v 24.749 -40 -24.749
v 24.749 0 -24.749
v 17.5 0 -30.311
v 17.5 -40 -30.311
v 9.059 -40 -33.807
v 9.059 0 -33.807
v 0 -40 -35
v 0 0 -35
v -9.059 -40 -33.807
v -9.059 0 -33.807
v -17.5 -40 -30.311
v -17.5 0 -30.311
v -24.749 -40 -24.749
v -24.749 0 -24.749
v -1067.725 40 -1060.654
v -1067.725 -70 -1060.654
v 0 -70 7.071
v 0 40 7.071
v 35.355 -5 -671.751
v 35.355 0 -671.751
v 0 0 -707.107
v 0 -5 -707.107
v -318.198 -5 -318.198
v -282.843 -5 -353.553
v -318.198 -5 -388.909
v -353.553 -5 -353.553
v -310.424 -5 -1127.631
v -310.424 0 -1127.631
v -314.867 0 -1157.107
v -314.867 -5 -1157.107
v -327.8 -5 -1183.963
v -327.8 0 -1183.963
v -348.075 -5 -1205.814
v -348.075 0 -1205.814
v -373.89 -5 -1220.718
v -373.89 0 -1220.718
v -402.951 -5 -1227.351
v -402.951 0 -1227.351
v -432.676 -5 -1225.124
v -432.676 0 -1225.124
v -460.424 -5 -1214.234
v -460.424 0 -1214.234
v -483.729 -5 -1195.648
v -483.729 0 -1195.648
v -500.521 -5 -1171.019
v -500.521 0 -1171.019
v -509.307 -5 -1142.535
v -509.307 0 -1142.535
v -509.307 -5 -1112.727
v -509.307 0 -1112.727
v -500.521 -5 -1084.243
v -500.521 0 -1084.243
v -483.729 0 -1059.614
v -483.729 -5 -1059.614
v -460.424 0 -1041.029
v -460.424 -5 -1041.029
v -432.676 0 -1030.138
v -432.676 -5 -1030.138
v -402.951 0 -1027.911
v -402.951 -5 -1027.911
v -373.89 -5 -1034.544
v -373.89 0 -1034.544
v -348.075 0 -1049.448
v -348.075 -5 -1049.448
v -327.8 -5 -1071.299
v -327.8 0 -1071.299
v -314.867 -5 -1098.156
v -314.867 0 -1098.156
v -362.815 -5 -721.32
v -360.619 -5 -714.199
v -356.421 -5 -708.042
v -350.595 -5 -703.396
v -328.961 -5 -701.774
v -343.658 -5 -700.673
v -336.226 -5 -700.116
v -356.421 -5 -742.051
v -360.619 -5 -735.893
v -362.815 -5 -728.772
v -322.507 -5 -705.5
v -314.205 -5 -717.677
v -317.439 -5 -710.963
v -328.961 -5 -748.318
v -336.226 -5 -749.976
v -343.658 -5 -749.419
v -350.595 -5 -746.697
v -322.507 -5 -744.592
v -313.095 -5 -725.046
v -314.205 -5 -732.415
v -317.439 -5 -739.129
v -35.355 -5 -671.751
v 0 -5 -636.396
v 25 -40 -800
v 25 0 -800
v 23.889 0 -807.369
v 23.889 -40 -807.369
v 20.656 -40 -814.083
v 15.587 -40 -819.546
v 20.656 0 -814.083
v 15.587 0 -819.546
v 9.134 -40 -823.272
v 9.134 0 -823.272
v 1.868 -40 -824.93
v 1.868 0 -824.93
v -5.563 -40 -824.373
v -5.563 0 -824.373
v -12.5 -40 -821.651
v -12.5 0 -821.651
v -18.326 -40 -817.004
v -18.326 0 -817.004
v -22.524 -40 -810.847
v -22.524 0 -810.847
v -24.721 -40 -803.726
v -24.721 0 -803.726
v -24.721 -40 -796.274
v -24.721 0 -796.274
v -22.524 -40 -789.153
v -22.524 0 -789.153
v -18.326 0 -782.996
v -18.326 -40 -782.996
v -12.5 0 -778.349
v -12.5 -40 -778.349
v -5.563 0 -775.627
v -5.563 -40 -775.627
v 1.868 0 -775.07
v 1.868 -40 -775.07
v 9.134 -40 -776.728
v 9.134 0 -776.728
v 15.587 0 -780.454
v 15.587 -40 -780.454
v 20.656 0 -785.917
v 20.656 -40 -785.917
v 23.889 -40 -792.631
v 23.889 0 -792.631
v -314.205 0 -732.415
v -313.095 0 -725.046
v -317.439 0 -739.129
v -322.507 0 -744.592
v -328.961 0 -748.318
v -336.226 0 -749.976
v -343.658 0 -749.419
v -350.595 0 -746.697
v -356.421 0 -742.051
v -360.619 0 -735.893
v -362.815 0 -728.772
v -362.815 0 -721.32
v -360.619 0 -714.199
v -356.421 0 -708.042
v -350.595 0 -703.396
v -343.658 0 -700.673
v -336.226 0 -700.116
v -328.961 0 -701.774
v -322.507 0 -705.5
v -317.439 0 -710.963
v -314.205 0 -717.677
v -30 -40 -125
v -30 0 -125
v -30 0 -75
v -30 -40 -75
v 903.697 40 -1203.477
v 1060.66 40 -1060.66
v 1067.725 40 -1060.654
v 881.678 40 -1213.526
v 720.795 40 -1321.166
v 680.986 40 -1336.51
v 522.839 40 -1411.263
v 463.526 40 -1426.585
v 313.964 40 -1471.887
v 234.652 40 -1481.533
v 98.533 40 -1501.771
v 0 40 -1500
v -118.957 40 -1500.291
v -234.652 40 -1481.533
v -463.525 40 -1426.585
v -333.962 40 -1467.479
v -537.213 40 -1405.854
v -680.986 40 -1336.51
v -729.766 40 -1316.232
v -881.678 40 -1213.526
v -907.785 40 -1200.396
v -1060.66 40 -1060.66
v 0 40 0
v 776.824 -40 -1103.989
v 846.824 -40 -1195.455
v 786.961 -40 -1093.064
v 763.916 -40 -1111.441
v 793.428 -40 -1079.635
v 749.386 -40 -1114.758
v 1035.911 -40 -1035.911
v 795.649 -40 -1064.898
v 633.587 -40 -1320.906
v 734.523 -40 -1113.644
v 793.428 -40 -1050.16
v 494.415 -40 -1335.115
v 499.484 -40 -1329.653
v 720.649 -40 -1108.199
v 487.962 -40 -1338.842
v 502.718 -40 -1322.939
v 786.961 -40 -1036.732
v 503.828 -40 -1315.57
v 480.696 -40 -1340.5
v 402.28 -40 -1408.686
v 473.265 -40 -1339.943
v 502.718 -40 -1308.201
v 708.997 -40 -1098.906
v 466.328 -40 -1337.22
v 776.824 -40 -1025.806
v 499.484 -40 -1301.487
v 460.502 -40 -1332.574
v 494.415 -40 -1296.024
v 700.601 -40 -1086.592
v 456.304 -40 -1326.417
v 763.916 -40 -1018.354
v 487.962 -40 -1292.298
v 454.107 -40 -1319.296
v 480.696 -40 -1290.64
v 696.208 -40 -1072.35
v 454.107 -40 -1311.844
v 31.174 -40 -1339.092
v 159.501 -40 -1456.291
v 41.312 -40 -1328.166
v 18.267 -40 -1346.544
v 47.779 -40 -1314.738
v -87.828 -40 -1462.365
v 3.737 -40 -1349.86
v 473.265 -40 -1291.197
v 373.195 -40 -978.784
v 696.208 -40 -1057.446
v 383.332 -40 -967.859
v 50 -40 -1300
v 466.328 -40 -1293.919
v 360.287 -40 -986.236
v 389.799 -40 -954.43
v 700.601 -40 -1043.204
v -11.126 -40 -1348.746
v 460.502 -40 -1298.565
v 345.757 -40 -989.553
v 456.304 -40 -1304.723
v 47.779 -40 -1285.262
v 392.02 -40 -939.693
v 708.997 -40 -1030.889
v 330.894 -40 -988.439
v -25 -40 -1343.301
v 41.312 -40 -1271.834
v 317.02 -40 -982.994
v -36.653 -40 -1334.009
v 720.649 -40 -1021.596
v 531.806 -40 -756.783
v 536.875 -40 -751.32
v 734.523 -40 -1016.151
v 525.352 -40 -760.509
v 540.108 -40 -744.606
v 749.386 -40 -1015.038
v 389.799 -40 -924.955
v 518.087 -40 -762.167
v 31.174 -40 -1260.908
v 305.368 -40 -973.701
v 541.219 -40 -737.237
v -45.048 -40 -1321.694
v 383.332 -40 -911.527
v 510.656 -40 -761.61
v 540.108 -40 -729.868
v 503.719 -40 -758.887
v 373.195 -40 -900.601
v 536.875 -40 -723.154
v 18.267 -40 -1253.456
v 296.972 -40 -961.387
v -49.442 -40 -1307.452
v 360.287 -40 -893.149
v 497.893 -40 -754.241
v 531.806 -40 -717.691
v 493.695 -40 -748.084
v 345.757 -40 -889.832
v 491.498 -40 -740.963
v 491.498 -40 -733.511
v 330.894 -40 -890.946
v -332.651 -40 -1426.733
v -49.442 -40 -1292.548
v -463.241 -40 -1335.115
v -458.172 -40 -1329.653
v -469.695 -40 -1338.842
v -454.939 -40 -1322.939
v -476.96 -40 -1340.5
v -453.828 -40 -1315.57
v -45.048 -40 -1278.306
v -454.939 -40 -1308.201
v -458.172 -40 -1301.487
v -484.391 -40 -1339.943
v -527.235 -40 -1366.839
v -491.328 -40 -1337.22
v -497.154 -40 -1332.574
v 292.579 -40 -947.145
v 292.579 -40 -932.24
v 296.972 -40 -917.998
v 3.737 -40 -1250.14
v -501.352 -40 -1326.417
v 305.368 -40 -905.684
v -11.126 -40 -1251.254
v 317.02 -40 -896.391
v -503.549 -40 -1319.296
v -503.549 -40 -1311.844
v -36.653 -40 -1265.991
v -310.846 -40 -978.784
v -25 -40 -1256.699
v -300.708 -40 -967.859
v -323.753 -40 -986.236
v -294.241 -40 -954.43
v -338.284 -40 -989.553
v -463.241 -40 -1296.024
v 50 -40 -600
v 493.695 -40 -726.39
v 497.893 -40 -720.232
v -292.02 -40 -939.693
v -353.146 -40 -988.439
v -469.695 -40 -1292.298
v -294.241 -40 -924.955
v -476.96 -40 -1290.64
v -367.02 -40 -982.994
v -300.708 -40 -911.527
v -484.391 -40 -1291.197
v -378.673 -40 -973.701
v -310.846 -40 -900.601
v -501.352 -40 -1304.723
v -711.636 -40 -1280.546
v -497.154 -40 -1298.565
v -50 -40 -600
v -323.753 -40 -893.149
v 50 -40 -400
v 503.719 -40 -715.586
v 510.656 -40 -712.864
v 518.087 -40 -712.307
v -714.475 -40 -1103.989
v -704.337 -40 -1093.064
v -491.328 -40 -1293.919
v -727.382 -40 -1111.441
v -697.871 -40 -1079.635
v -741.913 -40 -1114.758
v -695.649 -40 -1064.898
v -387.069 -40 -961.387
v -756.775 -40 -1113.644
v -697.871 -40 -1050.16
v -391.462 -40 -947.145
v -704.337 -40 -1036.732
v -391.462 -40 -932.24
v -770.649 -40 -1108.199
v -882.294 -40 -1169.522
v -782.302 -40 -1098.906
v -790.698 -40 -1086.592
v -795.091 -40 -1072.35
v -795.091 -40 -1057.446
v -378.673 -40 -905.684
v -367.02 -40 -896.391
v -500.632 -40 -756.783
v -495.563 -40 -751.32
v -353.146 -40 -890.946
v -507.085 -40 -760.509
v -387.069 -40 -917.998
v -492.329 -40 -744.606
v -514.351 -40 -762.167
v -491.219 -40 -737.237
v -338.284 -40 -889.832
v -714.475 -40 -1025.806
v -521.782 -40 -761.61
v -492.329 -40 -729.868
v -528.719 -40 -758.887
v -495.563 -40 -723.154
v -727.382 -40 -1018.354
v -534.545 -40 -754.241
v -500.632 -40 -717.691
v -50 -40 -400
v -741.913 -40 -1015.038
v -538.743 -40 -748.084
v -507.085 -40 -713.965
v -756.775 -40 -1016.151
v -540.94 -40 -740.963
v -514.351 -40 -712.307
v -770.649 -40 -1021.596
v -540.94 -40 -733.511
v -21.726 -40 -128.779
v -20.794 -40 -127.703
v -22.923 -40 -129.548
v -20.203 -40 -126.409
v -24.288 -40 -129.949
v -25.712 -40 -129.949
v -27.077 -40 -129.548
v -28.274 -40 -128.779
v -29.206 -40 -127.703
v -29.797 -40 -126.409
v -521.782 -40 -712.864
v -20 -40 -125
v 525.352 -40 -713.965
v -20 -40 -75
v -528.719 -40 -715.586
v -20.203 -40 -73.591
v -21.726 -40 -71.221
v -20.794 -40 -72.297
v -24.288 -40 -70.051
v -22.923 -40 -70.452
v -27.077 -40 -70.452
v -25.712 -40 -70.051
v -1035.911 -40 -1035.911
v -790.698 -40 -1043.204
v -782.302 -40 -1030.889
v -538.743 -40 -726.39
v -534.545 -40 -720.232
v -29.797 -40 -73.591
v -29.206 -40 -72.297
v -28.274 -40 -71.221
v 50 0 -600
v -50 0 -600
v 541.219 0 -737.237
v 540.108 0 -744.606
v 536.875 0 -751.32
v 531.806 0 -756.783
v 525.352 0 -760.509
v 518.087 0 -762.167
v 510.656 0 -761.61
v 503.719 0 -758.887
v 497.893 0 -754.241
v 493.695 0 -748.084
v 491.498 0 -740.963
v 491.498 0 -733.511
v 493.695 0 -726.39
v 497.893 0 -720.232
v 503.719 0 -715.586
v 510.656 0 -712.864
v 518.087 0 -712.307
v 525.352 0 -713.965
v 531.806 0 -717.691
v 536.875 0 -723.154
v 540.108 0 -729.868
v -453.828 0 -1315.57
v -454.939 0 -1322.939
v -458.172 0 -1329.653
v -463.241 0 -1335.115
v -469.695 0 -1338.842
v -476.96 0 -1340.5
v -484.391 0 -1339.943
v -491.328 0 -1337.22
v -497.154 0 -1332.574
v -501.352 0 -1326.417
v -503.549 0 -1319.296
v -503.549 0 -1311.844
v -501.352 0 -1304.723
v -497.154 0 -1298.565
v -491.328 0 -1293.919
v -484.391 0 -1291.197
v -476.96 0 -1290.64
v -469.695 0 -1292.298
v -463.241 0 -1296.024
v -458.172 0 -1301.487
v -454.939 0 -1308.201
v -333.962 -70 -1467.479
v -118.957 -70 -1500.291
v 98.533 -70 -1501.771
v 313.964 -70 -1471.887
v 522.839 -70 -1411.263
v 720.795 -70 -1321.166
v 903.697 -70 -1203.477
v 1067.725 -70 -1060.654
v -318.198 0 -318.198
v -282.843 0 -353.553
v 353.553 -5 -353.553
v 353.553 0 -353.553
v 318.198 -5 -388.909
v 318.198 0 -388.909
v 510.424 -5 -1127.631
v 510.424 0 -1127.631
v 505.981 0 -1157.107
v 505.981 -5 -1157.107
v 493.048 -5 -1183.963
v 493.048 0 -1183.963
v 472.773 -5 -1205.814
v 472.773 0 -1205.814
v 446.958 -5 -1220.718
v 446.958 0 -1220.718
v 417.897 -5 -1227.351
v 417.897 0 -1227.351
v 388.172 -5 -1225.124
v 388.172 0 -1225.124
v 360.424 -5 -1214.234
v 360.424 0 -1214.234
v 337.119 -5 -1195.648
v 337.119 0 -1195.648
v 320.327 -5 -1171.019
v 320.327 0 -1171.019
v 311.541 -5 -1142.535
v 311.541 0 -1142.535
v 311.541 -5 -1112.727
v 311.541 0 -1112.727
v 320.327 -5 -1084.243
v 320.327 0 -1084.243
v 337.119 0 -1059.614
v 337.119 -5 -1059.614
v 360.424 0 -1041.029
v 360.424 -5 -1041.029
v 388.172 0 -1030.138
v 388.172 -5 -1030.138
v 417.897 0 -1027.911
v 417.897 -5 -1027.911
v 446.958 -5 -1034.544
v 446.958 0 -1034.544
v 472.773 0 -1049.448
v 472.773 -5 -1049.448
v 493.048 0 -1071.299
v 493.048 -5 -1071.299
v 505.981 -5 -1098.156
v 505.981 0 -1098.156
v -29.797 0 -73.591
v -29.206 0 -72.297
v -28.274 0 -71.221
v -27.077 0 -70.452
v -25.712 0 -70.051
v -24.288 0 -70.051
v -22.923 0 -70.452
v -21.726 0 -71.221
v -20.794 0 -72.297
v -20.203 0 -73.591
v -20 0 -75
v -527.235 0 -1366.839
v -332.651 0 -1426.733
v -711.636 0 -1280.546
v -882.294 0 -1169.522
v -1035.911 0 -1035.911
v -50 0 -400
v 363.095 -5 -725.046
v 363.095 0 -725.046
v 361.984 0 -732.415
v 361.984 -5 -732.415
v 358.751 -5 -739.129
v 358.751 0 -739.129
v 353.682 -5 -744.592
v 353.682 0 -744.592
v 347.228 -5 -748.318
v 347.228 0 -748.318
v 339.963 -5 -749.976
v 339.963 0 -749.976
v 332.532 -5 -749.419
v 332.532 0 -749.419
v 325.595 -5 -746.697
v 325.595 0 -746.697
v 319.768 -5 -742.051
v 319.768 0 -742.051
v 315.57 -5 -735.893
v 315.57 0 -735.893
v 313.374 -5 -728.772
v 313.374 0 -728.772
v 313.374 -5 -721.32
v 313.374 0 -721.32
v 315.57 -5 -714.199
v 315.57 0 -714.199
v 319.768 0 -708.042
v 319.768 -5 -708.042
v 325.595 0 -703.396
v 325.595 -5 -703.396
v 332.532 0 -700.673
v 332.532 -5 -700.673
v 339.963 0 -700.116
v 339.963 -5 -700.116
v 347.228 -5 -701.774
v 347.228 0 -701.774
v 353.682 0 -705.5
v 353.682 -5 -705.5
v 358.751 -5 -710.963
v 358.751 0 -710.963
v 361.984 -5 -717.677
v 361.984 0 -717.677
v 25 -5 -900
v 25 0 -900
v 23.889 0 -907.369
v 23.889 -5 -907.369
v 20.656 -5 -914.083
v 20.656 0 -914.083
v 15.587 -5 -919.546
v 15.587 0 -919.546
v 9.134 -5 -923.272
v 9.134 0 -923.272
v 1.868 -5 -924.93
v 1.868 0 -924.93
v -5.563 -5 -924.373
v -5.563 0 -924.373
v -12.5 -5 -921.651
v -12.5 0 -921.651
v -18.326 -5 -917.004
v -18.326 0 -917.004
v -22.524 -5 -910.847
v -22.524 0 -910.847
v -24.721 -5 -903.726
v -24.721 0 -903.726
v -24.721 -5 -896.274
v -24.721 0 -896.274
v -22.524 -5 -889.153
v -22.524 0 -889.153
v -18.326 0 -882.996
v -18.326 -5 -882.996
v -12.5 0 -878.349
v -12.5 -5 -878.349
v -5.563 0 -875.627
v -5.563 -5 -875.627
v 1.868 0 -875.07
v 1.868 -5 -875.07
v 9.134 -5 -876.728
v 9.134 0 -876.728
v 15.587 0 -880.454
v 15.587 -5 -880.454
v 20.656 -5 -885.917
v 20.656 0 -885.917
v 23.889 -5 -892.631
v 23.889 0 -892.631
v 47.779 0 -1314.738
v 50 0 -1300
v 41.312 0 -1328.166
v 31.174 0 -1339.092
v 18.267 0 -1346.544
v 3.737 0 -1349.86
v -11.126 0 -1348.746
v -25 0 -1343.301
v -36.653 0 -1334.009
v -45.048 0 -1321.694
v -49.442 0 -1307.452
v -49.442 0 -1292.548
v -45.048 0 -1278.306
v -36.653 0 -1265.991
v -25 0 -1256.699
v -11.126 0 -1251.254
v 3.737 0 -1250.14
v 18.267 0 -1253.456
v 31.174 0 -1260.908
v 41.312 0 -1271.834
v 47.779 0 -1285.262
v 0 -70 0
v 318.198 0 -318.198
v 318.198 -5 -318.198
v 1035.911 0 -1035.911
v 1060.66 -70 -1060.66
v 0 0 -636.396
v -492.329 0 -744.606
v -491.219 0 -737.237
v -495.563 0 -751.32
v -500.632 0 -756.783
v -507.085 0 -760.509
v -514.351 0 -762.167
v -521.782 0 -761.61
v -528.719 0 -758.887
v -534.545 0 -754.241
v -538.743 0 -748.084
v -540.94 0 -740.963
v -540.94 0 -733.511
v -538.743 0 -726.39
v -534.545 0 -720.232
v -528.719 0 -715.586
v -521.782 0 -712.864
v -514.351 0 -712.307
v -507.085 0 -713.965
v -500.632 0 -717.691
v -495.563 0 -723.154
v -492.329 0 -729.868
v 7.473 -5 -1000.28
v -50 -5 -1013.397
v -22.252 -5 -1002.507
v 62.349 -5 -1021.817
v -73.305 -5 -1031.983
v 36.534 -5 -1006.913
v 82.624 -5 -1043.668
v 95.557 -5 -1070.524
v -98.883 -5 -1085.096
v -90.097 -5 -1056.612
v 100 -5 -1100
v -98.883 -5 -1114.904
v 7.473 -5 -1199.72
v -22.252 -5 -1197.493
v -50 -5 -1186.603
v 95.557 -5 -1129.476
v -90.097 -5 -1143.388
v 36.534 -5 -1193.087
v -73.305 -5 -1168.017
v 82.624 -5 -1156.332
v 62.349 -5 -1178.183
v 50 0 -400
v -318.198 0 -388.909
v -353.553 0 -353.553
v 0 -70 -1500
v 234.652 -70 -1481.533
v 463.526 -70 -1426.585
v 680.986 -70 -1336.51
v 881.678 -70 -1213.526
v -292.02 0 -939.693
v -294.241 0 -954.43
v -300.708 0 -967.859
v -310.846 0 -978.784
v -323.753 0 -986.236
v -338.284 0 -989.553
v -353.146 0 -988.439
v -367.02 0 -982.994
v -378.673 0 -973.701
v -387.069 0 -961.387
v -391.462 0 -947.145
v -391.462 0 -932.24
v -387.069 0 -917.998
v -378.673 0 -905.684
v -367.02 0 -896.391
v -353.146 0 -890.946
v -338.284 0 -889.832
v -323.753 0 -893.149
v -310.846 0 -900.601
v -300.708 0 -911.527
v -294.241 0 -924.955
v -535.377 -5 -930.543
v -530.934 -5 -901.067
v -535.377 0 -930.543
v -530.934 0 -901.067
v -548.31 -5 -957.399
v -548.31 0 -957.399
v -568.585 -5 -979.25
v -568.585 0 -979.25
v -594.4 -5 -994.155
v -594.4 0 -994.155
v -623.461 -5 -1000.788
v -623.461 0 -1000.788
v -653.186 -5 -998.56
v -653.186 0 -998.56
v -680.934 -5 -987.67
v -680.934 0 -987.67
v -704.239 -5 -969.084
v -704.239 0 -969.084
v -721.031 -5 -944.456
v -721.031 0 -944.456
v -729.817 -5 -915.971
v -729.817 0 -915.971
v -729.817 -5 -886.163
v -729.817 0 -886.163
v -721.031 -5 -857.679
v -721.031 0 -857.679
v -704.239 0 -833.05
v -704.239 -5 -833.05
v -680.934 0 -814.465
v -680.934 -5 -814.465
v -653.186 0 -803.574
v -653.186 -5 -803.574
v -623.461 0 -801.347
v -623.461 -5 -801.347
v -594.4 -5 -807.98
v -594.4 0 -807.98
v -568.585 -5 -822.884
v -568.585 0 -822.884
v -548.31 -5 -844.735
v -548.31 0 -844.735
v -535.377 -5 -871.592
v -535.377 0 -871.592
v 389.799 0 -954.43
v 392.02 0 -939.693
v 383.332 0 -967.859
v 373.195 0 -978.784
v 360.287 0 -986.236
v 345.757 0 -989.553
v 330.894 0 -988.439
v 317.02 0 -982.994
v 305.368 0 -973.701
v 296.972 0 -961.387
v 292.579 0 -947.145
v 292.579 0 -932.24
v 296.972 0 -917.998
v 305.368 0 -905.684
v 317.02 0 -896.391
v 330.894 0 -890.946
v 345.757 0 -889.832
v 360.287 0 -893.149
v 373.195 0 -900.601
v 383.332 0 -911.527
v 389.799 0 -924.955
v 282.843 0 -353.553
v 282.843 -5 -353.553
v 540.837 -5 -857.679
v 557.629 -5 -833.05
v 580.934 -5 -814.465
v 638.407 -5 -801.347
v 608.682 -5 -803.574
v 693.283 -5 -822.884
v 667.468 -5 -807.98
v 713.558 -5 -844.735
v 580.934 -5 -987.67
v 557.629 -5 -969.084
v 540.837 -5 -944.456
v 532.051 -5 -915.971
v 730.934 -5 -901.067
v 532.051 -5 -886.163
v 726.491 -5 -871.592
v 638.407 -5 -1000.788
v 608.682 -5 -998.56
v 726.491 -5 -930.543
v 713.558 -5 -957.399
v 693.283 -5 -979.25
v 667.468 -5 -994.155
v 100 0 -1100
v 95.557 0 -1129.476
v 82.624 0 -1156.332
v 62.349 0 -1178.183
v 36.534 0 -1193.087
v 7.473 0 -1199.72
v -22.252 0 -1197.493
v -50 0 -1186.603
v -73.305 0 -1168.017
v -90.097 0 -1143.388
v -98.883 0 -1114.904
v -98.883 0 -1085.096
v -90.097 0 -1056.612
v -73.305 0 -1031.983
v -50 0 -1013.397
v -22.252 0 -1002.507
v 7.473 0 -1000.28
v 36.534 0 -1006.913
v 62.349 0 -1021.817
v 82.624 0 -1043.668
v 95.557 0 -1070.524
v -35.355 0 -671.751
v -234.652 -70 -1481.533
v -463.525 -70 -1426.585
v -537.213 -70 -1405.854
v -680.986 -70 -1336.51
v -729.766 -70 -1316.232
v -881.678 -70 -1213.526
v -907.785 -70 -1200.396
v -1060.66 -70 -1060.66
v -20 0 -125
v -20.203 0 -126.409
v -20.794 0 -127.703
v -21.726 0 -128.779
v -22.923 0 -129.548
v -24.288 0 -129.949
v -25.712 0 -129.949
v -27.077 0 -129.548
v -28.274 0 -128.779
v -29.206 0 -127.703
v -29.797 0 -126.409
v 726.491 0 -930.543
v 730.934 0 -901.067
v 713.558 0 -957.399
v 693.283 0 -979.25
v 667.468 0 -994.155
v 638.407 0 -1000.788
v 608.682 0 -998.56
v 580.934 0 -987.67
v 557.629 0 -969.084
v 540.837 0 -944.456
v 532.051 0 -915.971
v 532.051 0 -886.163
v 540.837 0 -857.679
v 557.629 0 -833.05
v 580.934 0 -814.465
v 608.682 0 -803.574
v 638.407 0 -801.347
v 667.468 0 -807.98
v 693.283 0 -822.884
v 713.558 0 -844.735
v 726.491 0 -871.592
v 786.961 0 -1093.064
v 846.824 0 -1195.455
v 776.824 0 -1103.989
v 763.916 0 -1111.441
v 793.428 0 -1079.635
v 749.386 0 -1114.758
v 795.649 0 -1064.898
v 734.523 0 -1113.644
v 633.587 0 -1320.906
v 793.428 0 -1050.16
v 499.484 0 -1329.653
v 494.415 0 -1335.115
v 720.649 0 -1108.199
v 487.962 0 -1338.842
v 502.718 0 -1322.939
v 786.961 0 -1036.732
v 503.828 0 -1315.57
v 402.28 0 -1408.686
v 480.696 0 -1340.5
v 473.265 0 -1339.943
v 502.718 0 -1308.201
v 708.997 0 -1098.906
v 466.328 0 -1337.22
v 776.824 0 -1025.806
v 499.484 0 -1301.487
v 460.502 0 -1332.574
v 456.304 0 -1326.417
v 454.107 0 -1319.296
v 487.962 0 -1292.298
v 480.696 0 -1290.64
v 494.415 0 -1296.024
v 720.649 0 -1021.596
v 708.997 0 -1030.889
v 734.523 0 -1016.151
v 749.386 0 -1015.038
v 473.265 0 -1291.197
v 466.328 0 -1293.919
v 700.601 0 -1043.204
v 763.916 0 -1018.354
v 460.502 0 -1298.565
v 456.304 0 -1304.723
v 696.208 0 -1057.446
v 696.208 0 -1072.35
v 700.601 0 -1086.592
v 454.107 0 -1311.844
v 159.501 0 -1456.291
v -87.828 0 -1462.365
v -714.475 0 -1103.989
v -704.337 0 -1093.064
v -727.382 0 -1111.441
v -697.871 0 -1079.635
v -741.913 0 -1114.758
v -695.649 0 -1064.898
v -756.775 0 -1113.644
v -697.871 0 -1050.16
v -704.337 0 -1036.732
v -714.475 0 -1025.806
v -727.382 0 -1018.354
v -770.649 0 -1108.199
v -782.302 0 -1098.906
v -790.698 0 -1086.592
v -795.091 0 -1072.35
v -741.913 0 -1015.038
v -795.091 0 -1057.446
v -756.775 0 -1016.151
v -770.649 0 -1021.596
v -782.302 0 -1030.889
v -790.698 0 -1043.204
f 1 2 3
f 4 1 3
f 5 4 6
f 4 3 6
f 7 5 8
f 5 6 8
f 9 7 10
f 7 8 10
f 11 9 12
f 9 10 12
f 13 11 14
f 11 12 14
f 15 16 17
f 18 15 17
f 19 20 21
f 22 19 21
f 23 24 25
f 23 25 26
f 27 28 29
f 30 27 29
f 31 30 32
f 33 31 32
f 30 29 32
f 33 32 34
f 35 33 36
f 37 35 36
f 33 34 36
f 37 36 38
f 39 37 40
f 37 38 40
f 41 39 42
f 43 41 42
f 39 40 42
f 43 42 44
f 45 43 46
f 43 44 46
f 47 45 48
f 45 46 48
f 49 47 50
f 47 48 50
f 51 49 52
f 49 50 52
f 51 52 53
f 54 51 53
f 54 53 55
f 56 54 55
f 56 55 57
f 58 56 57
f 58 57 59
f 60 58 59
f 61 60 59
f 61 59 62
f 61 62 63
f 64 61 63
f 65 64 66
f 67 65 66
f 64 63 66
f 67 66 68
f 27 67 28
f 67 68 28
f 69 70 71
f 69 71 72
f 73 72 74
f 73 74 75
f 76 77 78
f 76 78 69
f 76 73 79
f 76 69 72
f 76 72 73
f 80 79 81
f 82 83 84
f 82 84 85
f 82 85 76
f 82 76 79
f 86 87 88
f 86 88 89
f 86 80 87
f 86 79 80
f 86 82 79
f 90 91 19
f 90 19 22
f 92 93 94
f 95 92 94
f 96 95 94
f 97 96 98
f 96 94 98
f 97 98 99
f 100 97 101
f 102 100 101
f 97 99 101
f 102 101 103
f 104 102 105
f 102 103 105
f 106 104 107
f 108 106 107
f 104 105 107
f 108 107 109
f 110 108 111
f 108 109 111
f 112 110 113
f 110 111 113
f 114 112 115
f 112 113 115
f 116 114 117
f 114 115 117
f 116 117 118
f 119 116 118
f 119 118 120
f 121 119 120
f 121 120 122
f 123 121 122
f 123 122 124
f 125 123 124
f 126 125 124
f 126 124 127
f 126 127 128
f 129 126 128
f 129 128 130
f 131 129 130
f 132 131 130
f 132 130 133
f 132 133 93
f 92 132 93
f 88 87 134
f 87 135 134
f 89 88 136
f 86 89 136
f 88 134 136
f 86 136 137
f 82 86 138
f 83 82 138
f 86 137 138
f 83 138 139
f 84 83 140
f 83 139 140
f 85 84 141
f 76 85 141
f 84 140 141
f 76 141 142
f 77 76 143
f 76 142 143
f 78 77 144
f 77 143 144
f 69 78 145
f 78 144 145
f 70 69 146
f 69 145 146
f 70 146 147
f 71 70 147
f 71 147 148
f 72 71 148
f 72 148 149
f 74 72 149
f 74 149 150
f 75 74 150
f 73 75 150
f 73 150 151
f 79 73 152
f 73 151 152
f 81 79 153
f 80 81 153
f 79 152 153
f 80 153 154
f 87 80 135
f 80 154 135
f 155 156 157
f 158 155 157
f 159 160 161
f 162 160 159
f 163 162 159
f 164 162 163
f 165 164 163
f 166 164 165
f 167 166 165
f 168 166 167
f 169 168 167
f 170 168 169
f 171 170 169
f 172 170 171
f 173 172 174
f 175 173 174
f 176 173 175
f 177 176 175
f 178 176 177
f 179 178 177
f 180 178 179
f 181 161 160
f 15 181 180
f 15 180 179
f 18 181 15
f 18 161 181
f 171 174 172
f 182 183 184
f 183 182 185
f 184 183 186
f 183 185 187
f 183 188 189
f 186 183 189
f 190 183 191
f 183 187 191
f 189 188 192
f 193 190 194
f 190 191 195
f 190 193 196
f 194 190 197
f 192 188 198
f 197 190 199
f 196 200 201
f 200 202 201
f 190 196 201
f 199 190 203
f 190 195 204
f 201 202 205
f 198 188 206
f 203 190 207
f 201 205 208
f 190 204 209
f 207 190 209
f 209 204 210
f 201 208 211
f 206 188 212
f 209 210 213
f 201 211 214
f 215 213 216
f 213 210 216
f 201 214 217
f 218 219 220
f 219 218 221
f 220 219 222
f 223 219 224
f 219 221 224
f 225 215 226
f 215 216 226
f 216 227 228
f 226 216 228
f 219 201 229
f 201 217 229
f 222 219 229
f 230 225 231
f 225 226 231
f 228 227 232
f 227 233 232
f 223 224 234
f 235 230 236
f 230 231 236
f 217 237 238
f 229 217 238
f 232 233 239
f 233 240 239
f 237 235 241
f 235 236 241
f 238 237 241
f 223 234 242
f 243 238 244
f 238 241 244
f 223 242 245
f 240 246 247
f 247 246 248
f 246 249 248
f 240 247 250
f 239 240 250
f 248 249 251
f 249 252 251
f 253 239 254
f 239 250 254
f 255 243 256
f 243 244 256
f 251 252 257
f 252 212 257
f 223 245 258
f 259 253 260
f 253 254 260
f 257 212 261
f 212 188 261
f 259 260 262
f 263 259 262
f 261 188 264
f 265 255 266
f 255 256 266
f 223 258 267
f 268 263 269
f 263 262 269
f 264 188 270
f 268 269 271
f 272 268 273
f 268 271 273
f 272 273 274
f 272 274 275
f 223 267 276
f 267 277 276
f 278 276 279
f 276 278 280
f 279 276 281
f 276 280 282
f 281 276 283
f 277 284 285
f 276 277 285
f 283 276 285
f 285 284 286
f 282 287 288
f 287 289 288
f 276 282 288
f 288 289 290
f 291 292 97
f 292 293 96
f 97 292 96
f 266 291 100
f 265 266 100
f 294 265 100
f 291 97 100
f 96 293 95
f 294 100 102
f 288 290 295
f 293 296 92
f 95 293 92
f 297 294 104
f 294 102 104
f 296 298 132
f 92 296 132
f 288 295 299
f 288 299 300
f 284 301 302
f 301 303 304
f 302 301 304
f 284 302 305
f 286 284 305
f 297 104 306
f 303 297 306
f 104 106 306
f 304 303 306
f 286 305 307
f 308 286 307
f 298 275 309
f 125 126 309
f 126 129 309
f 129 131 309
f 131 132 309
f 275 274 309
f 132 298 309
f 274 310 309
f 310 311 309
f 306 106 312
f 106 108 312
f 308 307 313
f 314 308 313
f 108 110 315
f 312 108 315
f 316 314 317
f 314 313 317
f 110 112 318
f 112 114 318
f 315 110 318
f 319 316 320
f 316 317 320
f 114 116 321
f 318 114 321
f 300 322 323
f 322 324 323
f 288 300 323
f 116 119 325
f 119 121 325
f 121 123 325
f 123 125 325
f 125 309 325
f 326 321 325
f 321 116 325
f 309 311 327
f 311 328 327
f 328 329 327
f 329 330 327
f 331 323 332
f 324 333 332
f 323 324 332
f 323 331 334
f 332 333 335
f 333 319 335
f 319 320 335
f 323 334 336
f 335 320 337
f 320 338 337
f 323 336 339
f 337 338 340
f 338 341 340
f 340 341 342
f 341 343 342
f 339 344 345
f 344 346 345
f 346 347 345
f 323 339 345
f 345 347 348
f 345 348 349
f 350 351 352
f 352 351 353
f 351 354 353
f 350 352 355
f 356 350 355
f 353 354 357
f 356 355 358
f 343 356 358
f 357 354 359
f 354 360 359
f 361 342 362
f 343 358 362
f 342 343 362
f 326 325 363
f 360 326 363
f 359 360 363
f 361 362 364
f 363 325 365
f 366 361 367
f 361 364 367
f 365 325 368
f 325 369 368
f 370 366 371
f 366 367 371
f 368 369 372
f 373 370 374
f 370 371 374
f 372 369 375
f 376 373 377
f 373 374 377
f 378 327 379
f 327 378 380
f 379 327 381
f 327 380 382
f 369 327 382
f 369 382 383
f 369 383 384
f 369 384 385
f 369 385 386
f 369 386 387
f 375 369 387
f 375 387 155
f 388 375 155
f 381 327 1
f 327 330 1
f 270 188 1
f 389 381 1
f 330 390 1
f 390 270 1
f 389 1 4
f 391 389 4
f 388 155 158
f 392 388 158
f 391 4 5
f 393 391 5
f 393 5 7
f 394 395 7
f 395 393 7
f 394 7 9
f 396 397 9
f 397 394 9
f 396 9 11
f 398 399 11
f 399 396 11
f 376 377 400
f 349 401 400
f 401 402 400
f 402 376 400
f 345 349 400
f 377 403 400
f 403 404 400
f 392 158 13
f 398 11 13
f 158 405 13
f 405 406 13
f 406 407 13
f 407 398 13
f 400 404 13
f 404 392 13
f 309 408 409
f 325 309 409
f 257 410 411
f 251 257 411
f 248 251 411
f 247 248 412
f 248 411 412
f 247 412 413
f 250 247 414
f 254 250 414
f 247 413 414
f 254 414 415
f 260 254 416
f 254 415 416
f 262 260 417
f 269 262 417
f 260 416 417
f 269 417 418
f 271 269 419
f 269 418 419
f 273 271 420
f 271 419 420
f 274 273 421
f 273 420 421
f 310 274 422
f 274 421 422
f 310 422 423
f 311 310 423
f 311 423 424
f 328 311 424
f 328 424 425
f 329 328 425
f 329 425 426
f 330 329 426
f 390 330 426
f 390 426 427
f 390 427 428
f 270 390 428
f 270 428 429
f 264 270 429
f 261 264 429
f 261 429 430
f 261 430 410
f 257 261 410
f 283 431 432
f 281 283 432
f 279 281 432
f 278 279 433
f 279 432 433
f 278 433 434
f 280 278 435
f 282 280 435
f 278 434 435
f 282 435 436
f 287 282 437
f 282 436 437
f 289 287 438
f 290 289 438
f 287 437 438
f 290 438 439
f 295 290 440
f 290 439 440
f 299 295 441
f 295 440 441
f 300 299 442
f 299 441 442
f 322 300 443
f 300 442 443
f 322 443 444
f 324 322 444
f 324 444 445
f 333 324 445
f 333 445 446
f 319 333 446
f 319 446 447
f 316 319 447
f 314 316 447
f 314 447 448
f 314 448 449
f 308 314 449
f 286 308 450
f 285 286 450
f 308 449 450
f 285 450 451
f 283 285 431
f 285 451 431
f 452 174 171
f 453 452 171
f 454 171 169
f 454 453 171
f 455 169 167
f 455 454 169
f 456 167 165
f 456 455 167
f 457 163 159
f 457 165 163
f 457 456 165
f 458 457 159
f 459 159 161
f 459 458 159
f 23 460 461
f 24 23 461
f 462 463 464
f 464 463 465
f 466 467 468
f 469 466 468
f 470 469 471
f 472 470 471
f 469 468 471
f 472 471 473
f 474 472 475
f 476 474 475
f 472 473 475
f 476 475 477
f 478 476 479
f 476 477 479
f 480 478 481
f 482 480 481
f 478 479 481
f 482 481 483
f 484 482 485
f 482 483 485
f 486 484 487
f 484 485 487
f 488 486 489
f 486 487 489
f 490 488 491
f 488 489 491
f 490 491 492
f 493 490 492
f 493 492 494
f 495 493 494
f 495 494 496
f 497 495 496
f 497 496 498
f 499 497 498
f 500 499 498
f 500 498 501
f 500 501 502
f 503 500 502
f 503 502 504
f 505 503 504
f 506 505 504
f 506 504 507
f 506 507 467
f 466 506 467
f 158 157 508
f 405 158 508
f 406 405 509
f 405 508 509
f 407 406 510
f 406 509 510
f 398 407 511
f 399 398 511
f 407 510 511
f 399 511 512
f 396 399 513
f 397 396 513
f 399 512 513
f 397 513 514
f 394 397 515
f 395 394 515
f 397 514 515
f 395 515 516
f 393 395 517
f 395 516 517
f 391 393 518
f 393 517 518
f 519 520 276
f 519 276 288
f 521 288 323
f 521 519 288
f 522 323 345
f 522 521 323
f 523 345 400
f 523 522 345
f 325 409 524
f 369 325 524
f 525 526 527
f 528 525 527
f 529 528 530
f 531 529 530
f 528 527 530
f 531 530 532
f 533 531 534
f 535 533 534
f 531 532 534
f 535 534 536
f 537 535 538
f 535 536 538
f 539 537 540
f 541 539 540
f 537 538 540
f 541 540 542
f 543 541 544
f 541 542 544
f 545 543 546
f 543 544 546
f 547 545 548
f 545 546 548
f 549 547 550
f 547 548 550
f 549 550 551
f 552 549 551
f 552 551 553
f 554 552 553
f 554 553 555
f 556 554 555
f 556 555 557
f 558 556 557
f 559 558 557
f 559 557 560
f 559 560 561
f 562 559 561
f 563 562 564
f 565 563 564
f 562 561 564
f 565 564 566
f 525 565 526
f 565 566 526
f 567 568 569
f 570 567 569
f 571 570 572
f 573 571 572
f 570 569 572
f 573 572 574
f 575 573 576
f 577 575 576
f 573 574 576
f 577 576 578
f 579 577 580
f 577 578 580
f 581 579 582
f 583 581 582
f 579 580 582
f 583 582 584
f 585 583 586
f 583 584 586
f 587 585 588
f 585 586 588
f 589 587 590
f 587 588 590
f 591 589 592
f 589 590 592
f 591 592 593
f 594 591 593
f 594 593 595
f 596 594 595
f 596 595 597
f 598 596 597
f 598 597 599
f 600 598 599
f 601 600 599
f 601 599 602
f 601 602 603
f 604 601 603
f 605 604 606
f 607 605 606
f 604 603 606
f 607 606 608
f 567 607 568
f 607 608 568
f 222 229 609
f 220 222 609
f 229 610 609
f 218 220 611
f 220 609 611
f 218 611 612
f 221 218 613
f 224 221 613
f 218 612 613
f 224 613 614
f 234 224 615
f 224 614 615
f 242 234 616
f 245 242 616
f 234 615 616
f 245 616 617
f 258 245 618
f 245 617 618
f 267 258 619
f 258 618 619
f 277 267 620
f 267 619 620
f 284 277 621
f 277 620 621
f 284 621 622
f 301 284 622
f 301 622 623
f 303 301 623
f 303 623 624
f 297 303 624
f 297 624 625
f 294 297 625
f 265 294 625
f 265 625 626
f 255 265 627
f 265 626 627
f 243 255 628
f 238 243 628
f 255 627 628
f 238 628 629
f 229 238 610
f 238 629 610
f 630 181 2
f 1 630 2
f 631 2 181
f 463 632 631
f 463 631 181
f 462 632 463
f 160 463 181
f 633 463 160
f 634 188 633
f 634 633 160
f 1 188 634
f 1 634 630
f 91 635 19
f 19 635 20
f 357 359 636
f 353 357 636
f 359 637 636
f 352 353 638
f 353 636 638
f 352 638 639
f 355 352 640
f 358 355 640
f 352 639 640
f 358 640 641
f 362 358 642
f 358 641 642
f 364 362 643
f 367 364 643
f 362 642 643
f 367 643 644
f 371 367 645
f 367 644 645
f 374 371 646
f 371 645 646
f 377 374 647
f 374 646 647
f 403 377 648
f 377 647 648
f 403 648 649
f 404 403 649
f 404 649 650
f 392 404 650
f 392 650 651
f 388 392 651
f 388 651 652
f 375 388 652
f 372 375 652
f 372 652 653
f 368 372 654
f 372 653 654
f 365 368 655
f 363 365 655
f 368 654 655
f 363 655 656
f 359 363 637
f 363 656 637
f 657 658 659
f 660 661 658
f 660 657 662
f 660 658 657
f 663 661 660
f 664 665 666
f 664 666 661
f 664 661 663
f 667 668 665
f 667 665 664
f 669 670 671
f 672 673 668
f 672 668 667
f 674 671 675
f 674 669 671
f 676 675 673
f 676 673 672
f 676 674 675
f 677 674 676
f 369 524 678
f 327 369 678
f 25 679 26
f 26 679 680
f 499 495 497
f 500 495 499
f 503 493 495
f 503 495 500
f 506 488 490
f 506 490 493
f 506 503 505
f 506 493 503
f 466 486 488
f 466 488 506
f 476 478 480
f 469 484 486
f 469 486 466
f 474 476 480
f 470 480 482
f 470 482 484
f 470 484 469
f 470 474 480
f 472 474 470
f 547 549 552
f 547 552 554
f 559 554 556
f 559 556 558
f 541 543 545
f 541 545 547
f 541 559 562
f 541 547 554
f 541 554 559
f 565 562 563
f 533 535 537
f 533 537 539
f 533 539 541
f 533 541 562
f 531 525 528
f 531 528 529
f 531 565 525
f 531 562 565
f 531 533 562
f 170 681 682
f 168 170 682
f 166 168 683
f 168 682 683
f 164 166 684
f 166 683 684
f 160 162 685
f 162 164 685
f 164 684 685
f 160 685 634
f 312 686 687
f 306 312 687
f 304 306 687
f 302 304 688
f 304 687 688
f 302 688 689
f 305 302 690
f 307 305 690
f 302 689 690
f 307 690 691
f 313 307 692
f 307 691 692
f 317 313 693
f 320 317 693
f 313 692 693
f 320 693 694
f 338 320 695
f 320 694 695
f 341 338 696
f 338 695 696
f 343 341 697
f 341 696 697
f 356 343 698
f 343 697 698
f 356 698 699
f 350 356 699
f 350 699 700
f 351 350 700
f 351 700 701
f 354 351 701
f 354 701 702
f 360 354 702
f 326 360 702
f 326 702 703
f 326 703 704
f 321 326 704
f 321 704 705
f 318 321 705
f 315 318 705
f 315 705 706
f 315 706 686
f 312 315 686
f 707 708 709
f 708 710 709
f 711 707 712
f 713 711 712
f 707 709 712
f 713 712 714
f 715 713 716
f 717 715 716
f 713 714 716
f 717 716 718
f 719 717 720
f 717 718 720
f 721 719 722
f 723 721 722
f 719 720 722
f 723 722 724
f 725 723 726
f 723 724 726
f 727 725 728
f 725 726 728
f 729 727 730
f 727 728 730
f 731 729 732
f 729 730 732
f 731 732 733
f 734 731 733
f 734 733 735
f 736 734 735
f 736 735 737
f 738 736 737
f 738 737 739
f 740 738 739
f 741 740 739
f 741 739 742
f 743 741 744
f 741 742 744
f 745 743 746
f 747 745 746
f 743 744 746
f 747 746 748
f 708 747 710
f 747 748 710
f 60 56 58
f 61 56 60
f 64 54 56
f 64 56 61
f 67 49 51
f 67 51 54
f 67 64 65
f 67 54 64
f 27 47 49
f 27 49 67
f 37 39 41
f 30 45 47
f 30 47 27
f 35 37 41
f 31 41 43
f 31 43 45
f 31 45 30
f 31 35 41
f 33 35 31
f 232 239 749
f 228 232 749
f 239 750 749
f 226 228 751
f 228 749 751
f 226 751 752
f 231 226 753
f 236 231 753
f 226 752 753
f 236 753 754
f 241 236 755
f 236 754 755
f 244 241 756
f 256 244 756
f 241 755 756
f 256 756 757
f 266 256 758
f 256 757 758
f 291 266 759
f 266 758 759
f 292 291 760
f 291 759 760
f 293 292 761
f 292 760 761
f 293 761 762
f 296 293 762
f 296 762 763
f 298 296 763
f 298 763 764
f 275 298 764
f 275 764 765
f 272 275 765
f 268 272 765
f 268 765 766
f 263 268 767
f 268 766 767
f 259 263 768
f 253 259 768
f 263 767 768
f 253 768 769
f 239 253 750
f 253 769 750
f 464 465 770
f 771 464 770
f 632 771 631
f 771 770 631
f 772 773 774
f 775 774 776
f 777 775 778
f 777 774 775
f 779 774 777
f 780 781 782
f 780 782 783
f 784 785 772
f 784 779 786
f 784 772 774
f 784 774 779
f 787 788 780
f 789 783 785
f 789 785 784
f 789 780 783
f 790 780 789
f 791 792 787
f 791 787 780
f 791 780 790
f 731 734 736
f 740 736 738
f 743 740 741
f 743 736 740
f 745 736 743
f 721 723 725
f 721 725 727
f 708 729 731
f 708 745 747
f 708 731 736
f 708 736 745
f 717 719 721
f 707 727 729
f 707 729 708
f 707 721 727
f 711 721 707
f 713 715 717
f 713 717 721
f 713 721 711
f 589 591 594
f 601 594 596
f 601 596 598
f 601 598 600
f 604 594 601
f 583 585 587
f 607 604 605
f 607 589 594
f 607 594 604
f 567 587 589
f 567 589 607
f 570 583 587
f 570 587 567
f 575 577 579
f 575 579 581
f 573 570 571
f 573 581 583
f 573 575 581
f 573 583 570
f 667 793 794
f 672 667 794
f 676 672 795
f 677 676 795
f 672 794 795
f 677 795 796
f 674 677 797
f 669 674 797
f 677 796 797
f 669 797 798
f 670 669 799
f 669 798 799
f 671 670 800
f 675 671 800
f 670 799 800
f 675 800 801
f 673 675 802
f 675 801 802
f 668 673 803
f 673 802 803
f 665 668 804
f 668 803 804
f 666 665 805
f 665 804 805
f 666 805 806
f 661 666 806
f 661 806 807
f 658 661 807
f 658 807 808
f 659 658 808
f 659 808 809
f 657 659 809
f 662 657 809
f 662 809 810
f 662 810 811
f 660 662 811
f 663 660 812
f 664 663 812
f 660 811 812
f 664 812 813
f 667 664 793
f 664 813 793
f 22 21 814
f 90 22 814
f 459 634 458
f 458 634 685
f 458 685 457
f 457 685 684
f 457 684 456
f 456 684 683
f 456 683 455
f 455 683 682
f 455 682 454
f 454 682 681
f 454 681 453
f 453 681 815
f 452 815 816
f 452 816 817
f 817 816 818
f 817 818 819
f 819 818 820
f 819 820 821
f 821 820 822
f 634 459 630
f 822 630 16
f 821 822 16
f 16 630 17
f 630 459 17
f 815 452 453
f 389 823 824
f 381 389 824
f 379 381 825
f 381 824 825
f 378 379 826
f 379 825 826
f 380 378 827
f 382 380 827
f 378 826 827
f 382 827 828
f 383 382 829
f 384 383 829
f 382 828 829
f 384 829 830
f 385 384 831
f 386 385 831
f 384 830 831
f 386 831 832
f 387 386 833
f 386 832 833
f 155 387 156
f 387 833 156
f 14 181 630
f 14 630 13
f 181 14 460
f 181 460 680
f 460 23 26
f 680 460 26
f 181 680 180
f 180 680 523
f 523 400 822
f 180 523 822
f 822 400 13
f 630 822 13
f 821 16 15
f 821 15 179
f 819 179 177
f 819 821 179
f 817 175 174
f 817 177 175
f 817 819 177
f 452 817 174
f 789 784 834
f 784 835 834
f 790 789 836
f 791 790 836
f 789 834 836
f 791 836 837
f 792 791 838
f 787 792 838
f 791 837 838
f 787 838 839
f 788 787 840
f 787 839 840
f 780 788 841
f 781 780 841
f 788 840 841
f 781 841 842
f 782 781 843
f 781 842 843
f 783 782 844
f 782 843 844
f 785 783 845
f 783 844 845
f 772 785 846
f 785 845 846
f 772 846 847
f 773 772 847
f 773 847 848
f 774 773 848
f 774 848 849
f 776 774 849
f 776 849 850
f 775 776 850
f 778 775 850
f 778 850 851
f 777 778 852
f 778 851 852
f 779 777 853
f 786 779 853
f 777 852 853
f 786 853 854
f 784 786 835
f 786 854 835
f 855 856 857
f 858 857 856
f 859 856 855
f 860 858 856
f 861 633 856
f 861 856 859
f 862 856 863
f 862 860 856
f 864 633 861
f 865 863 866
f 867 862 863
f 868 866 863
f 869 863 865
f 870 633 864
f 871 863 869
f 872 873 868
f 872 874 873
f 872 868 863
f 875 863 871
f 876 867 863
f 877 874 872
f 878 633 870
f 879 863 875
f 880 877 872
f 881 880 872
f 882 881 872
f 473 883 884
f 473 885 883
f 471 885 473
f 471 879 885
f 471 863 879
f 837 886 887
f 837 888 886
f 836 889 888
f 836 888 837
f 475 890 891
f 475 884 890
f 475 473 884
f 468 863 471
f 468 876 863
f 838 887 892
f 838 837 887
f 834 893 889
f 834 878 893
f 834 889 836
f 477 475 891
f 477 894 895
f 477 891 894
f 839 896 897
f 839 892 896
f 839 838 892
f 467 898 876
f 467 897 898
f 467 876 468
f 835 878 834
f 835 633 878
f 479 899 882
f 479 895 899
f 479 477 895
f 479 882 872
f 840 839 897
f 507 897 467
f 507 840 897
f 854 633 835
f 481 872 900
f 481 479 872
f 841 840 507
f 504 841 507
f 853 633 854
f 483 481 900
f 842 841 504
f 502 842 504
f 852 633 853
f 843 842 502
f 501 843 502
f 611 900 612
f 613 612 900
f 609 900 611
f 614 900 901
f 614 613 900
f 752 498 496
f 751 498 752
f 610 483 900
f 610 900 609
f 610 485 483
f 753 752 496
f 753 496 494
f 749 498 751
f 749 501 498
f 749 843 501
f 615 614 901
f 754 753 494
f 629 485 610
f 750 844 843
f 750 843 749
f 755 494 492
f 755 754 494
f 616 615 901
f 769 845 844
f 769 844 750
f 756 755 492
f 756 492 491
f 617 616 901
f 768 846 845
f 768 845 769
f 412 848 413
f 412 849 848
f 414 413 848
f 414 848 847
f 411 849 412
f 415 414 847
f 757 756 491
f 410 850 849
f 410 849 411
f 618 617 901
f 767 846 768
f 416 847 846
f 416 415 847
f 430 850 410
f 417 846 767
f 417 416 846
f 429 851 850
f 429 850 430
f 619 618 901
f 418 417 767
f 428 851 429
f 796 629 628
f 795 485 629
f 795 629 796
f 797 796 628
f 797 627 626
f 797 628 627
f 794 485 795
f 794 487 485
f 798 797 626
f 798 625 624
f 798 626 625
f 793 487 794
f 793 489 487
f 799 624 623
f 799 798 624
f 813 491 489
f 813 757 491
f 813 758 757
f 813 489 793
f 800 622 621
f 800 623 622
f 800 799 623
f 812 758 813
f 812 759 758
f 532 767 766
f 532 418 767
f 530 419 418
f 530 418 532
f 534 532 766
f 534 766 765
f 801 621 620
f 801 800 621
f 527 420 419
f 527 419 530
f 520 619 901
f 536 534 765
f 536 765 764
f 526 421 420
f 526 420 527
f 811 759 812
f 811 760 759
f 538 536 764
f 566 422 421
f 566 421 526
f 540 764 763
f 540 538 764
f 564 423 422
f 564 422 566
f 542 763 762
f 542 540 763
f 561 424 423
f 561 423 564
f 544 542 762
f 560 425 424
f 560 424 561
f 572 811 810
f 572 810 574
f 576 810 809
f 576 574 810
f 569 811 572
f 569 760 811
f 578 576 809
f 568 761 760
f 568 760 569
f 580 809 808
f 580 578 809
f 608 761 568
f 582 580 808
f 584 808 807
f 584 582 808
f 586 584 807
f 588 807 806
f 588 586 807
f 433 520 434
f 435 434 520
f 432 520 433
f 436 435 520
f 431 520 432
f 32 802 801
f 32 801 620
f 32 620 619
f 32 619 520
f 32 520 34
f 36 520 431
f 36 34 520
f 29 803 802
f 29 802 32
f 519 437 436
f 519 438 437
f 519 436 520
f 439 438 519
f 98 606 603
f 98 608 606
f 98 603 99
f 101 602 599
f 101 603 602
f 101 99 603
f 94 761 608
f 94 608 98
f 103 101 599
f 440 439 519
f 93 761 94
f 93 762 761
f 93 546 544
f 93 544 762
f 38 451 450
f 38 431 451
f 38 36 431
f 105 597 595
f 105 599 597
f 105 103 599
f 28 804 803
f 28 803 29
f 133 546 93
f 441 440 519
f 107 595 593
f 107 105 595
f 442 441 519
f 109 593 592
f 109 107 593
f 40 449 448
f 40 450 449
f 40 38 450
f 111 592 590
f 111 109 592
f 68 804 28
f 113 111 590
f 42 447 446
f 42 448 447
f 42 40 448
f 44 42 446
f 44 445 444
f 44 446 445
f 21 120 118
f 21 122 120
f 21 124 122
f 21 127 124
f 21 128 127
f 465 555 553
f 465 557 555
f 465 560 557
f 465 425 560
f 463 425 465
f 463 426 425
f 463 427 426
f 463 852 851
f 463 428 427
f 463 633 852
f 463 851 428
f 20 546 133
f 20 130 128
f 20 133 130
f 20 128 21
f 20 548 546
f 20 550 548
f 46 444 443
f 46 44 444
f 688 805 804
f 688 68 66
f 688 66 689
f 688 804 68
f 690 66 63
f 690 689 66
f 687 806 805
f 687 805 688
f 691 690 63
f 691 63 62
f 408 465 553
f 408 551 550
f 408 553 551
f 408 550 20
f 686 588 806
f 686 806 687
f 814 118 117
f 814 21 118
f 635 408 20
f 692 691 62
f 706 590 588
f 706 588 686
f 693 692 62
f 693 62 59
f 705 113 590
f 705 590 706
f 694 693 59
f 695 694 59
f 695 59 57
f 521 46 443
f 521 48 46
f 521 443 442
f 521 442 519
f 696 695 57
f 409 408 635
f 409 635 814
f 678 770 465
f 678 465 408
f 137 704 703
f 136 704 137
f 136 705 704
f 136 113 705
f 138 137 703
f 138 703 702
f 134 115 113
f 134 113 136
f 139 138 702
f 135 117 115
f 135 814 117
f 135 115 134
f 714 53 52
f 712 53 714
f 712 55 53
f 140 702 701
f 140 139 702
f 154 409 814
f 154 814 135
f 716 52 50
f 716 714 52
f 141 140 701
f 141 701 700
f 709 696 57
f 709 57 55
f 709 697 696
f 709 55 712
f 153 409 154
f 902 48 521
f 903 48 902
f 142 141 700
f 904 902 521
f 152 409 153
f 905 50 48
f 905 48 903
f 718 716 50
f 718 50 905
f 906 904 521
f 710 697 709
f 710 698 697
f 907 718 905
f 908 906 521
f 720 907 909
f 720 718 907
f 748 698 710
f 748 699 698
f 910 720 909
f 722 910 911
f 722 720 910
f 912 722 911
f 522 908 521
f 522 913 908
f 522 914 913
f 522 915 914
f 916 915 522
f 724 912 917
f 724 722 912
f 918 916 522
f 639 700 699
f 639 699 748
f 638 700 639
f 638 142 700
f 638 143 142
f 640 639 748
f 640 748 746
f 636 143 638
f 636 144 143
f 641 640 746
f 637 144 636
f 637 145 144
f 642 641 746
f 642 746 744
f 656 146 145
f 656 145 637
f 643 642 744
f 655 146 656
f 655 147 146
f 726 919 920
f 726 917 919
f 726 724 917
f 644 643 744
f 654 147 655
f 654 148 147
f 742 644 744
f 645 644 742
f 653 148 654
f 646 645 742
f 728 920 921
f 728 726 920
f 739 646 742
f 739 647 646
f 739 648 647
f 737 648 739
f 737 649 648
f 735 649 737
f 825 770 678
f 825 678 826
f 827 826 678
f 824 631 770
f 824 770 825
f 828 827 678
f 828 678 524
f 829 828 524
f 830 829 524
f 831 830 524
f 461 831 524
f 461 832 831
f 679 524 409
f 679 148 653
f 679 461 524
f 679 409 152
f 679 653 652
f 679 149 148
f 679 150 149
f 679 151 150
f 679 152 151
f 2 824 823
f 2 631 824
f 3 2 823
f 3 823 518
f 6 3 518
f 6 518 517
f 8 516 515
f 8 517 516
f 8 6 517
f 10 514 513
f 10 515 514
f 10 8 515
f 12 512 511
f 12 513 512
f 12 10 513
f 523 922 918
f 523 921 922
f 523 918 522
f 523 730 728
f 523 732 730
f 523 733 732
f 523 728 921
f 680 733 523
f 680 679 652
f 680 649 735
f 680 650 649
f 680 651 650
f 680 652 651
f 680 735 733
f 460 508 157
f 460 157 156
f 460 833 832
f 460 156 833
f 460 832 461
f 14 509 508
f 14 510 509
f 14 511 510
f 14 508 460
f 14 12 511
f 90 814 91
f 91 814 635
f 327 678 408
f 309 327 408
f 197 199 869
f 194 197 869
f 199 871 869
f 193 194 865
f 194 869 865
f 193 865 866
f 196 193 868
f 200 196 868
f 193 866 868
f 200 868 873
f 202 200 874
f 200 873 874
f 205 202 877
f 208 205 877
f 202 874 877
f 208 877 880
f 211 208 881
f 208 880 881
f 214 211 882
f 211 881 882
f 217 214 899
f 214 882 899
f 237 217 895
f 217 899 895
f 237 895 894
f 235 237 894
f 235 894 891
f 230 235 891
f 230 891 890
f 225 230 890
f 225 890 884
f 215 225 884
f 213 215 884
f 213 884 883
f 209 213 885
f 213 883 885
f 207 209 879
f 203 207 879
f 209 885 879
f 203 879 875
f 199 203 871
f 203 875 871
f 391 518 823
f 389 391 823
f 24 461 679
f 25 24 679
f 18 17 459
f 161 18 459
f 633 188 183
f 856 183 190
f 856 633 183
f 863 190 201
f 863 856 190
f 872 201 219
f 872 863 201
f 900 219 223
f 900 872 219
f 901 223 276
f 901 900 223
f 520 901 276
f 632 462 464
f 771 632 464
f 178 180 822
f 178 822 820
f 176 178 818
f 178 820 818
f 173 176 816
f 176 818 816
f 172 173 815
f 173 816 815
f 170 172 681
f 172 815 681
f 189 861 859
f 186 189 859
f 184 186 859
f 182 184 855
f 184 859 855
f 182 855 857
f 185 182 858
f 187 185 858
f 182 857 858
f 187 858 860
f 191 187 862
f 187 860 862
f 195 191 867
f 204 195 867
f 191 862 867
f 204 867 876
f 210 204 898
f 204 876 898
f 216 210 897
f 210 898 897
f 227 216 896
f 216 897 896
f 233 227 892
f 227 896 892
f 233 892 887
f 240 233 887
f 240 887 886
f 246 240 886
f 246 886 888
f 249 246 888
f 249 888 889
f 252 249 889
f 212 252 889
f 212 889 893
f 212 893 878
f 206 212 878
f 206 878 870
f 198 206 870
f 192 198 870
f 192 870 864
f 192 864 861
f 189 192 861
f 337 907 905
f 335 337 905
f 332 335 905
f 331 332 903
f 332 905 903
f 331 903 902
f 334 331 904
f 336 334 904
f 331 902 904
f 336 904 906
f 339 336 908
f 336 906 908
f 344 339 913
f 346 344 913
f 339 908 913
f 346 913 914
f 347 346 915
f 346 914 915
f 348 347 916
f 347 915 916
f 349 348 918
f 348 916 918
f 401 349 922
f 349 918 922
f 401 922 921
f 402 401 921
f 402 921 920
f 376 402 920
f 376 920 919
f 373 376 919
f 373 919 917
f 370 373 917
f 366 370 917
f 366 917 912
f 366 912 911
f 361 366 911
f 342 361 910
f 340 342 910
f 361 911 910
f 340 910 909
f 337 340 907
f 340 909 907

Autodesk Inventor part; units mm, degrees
ref_plane "YZ Plane" through (0, 0, 0) normal (1, 0, 0) x (0, 1, 0)
ref_plane "XZ Plane" through (0, 0, 0) normal (0, 1, 0) x (-1, 0, 0)
ref_plane "XY Plane" through (0, 0, 0) normal (0, 0, 1) x (1, 0, 0)
sketch "草圖1" plane through (0, 0, 0) normal (0, 1, 0) x (-1, 0, 0)
  line L0 (0, 0) -> (-1060.6602, -1060.6602)
  arc A0 (-1060.6602, -1060.6602) -> (0, -1500) centre (0, 0) ccw
  line L1 (0, -1500) -> (0, 0)
  line L2 (0, 0) -> (1060.6602, -1060.6602)
  arc A1 (0, -1500) -> (1060.6602, -1060.6602) centre (0, 0) ccw
  line L3 (1067.7254, -1060.6543) -> (0, 7.0711)
  line L4 (0, 7.0711) -> (-1067.7254, -1060.6543)
  arc A2 (-1067.7254, -1060.6543) -> (333.9619, -1467.4789) centre (0, 0) ccw
  arc A3 (333.9619, -1467.4789) -> (1067.7254, -1060.6543) centre (0, 0) ccw
  arc A4 (-1035.9114, -1035.9114) -> (332.6512, -1426.7334) centre (0, 0) ccw
  arc A5 (332.6512, -1426.7334) -> (1035.9114, -1035.9114) centre (0, 0) ccw
  line L5 (1549.2947, 0) -> (-1565.2813, 0) projected
  arc A6 (-24.7487, -24.7487) -> (24.7487, -24.7487) centre (0, 0) ccw
  line L6 (25, -130) -> (25, -70) construction
  line L7 (30, -125) -> (30, -75)
  line L8 (20, -75) -> (20, -125)
  arc A7 (20, -125) -> (30, -125) centre (25, -125) ccw
  arc A8 (30, -75) -> (20, -75) centre (25, -75) ccw
  line L9 (50, -400) -> (-50, -400)
  line L10 (-50, -400) -> (-50, -600)
  line L11 (-50, -600) -> (50, -600)
  line L12 (50, -600) -> (50, -400)
  line L13 (50, -400) -> (-50, -600) construction
  line L14 (-50, -400) -> (50, -600) construction
  point P0 (-7.0711, 0)
  point P1 (7.0711, 0)
  point P2 (24.7487, -682.358)
  point P3 (-24.7487, -682.358)
  point P4 (353.5534, -353.5534)
  point P5 (353.5534, -353.5534)
  point P6 (-353.5534, -353.5534)
  point P7 (-353.5534, -353.5534)
  point P8 (-7.0711, 0)
  point P9 (7.0711, 0)
  point P10 (25, -100)
  point P11 (0, -500)
  dimension "d0" = 1500
  dimension "d2" = 5
  dimension "d3" = 35
  dimension "d7" = 45
  dimension "d8" = 35
  dimension "d26" = 5
  dimension "d27" = 50
  dimension "d28" = 100
  dimension "d29" = 50
  dimension "d32" = 100
  dimension "d33" = 200
  dimension "d39" = 300
extrude "擠出1" add sketch "草圖1" along normal blind 40 and the other way blind 70 contours L5 L4 L3 | L5 L3 A3 A2 L4
extrude "擠出2" add sketch "草圖1" against normal blind 40 contours A6 L1 L9 L10 L11 A4 L0 | A6 L2 A5 A4 L1 L11 L12 L9
sketch "草圖2" plane through (0, 0, 0) normal (0, 1, 0) x (-1, 0, 0)
  line L0 (353.5534, -353.5534) -> (0, -707.1068) construction
  line L1 (0, -707.1068) -> (-353.5534, -353.5534) construction
  line L2 (-353.5534, -353.5534) -> (0, 0) construction
  line L3 (0, 0) -> (353.5534, -353.5534) construction
  line L4 (0, -707.1068) -> (35.3553, -671.7514)
  line L5 (35.3553, -671.7514) -> (0, -636.3961)
  line L6 (0, -636.3961) -> (-35.3553, -671.7514)
  line L7 (-35.3553, -671.7514) -> (0, -707.1068)
  line L8 (318.1981, -388.9087) -> (353.5534, -353.5534)
  line L9 (353.5534, -353.5534) -> (318.1981, -318.1981)
  line L10 (318.1981, -318.1981) -> (282.8427, -353.5534)
  line L11 (282.8427, -353.5534) -> (318.1981, -388.9087)
  line L12 (-318.1981, -388.9087) -> (-282.8427, -353.5534)
  line L13 (-282.8427, -353.5534) -> (-318.1981, -318.1981)
  line L14 (-318.1981, -318.1981) -> (-353.5534, -353.5534)
  line L15 (-353.5534, -353.5534) -> (-318.1981, -388.9087)
  line L16 (-1060.6602, -1060.6602) -> (0, 0) projected
  line L17 (0, 0) -> (1060.6602, -1060.6602) projected
  arc A0 (-24.7487, -24.7487) -> (24.7487, -24.7487) centre (0, 0) ccw projected
  dimension "d15" = 500
  dimension "d19" = 50
  dimension "d20" = 50
  dimension "d21" = 50
extrude "擠出3" cut sketch "草圖2" against normal blind 5 contours L7 L6 L5 L4 | L11 L10 L9 L8 | L13 L12 L15 L14
sketch "草圖6" plane through (0, 0, 0) normal (0, 1, 0) x (1, 0, 0)
  line L0 (0, 0) -> (1060.6602, 1060.6602) projected
  line L1 (-1067.7254, 1060.6543) -> (0, -7.0711) projected
  arc A0 (919.2388, 919.2388) -> (-922.7676, 915.6965) centre (0, 0) ccw construction
  line L2 (0, 0) -> (-1060.6602, 1060.6602) projected
  arc A1 (777.8175, 777.8175) -> (-777.8175, 777.8175) centre (0, 0) ccw construction
  arc A2 (636.3961, 636.3961) -> (-634.8813, 637.9073) centre (0, 0) ccw construction
  circle A3 centre (0, 1300) radius 50
  arc A4 (1035.9114, 1035.9114) -> (-1035.9114, 1035.9114) centre (0, 0) ccw projected
  line L3 (0, 1465) -> (0, 0) construction
  circle A5 centre (0, 1100) radius 100
  circle A6 centre (0, 900) radius 25
  circle A7 centre (-745.6494, 1064.8977) radius 50
  circle A8 centre (-630.9341, 901.0672) radius 100
  circle A9 centre (-516.2188, 737.2368) radius 25
  circle A10 centre (745.6494, 1064.8977) radius 50
  circle A11 centre (630.9341, 901.0672) radius 100
  circle A12 centre (516.2188, 737.2368) radius 25
  arc A13 (989.9495, 989.9495) -> (-993.7497, 986.1347) centre (0, 0) ccw construction
  arc A14 (848.5281, 848.5281) -> (-848.5281, 848.5281) centre (0, 0) ccw construction
  arc A15 (707.1068, 707.1068) -> (-705.4236, 708.7859) centre (0, 0) ccw construction
  line L4 (0, 0) -> (501.0595, 1376.6497) construction
  circle A16 centre (342.0201, 939.6926) radius 50
  circle A17 centre (478.8282, 1315.5697) radius 25
  circle A18 centre (410.4242, 1127.6311) radius 100
  circle A19 centre (-342.0201, 939.6926) radius 50
  circle A20 centre (-478.8282, 1315.5697) radius 25
  circle A21 centre (-410.4242, 1127.6311) radius 100
  arc A22 (565.6854, 565.6854) -> (-565.6854, 565.6854) centre (0, 0) ccw construction
  circle A23 centre (0, 800) radius 25
  circle A24 centre (-338.0946, 725.0462) radius 25
  circle A25 centre (338.0946, 725.0462) radius 25
  point P0 (0, 1100)
  dimension "d44" = 1300
  dimension "d45" = 1100
  dimension "d46" = 900
  dimension "d47" = 100
  dimension "d48" = 200
  dimension "d49" = 50
  dimension "d52" = 35
  dimension "d54" = 100
  dimension "d55" = 100
  dimension "d56" = 100
  dimension "d57" = 25
  dimension "d58" = 100
  dimension "d59" = 50
  dimension "d60" = 200
  dimension "d63" = 100
  dimension "d66" = 50
  dimension "d69" = 25
extrude "擠出6" cut sketch "草圖6" against normal blind 5 contours A5 | A6 | A8 | A11 | A18 | A21 | A24 | A25
extrude "擠出7" cut sketch "草圖6" against normal through all contours A3 | A7 | A9 | A10 | A12 | A16 | A17 | A19 | A20 | A23
properties part number "球場2"
